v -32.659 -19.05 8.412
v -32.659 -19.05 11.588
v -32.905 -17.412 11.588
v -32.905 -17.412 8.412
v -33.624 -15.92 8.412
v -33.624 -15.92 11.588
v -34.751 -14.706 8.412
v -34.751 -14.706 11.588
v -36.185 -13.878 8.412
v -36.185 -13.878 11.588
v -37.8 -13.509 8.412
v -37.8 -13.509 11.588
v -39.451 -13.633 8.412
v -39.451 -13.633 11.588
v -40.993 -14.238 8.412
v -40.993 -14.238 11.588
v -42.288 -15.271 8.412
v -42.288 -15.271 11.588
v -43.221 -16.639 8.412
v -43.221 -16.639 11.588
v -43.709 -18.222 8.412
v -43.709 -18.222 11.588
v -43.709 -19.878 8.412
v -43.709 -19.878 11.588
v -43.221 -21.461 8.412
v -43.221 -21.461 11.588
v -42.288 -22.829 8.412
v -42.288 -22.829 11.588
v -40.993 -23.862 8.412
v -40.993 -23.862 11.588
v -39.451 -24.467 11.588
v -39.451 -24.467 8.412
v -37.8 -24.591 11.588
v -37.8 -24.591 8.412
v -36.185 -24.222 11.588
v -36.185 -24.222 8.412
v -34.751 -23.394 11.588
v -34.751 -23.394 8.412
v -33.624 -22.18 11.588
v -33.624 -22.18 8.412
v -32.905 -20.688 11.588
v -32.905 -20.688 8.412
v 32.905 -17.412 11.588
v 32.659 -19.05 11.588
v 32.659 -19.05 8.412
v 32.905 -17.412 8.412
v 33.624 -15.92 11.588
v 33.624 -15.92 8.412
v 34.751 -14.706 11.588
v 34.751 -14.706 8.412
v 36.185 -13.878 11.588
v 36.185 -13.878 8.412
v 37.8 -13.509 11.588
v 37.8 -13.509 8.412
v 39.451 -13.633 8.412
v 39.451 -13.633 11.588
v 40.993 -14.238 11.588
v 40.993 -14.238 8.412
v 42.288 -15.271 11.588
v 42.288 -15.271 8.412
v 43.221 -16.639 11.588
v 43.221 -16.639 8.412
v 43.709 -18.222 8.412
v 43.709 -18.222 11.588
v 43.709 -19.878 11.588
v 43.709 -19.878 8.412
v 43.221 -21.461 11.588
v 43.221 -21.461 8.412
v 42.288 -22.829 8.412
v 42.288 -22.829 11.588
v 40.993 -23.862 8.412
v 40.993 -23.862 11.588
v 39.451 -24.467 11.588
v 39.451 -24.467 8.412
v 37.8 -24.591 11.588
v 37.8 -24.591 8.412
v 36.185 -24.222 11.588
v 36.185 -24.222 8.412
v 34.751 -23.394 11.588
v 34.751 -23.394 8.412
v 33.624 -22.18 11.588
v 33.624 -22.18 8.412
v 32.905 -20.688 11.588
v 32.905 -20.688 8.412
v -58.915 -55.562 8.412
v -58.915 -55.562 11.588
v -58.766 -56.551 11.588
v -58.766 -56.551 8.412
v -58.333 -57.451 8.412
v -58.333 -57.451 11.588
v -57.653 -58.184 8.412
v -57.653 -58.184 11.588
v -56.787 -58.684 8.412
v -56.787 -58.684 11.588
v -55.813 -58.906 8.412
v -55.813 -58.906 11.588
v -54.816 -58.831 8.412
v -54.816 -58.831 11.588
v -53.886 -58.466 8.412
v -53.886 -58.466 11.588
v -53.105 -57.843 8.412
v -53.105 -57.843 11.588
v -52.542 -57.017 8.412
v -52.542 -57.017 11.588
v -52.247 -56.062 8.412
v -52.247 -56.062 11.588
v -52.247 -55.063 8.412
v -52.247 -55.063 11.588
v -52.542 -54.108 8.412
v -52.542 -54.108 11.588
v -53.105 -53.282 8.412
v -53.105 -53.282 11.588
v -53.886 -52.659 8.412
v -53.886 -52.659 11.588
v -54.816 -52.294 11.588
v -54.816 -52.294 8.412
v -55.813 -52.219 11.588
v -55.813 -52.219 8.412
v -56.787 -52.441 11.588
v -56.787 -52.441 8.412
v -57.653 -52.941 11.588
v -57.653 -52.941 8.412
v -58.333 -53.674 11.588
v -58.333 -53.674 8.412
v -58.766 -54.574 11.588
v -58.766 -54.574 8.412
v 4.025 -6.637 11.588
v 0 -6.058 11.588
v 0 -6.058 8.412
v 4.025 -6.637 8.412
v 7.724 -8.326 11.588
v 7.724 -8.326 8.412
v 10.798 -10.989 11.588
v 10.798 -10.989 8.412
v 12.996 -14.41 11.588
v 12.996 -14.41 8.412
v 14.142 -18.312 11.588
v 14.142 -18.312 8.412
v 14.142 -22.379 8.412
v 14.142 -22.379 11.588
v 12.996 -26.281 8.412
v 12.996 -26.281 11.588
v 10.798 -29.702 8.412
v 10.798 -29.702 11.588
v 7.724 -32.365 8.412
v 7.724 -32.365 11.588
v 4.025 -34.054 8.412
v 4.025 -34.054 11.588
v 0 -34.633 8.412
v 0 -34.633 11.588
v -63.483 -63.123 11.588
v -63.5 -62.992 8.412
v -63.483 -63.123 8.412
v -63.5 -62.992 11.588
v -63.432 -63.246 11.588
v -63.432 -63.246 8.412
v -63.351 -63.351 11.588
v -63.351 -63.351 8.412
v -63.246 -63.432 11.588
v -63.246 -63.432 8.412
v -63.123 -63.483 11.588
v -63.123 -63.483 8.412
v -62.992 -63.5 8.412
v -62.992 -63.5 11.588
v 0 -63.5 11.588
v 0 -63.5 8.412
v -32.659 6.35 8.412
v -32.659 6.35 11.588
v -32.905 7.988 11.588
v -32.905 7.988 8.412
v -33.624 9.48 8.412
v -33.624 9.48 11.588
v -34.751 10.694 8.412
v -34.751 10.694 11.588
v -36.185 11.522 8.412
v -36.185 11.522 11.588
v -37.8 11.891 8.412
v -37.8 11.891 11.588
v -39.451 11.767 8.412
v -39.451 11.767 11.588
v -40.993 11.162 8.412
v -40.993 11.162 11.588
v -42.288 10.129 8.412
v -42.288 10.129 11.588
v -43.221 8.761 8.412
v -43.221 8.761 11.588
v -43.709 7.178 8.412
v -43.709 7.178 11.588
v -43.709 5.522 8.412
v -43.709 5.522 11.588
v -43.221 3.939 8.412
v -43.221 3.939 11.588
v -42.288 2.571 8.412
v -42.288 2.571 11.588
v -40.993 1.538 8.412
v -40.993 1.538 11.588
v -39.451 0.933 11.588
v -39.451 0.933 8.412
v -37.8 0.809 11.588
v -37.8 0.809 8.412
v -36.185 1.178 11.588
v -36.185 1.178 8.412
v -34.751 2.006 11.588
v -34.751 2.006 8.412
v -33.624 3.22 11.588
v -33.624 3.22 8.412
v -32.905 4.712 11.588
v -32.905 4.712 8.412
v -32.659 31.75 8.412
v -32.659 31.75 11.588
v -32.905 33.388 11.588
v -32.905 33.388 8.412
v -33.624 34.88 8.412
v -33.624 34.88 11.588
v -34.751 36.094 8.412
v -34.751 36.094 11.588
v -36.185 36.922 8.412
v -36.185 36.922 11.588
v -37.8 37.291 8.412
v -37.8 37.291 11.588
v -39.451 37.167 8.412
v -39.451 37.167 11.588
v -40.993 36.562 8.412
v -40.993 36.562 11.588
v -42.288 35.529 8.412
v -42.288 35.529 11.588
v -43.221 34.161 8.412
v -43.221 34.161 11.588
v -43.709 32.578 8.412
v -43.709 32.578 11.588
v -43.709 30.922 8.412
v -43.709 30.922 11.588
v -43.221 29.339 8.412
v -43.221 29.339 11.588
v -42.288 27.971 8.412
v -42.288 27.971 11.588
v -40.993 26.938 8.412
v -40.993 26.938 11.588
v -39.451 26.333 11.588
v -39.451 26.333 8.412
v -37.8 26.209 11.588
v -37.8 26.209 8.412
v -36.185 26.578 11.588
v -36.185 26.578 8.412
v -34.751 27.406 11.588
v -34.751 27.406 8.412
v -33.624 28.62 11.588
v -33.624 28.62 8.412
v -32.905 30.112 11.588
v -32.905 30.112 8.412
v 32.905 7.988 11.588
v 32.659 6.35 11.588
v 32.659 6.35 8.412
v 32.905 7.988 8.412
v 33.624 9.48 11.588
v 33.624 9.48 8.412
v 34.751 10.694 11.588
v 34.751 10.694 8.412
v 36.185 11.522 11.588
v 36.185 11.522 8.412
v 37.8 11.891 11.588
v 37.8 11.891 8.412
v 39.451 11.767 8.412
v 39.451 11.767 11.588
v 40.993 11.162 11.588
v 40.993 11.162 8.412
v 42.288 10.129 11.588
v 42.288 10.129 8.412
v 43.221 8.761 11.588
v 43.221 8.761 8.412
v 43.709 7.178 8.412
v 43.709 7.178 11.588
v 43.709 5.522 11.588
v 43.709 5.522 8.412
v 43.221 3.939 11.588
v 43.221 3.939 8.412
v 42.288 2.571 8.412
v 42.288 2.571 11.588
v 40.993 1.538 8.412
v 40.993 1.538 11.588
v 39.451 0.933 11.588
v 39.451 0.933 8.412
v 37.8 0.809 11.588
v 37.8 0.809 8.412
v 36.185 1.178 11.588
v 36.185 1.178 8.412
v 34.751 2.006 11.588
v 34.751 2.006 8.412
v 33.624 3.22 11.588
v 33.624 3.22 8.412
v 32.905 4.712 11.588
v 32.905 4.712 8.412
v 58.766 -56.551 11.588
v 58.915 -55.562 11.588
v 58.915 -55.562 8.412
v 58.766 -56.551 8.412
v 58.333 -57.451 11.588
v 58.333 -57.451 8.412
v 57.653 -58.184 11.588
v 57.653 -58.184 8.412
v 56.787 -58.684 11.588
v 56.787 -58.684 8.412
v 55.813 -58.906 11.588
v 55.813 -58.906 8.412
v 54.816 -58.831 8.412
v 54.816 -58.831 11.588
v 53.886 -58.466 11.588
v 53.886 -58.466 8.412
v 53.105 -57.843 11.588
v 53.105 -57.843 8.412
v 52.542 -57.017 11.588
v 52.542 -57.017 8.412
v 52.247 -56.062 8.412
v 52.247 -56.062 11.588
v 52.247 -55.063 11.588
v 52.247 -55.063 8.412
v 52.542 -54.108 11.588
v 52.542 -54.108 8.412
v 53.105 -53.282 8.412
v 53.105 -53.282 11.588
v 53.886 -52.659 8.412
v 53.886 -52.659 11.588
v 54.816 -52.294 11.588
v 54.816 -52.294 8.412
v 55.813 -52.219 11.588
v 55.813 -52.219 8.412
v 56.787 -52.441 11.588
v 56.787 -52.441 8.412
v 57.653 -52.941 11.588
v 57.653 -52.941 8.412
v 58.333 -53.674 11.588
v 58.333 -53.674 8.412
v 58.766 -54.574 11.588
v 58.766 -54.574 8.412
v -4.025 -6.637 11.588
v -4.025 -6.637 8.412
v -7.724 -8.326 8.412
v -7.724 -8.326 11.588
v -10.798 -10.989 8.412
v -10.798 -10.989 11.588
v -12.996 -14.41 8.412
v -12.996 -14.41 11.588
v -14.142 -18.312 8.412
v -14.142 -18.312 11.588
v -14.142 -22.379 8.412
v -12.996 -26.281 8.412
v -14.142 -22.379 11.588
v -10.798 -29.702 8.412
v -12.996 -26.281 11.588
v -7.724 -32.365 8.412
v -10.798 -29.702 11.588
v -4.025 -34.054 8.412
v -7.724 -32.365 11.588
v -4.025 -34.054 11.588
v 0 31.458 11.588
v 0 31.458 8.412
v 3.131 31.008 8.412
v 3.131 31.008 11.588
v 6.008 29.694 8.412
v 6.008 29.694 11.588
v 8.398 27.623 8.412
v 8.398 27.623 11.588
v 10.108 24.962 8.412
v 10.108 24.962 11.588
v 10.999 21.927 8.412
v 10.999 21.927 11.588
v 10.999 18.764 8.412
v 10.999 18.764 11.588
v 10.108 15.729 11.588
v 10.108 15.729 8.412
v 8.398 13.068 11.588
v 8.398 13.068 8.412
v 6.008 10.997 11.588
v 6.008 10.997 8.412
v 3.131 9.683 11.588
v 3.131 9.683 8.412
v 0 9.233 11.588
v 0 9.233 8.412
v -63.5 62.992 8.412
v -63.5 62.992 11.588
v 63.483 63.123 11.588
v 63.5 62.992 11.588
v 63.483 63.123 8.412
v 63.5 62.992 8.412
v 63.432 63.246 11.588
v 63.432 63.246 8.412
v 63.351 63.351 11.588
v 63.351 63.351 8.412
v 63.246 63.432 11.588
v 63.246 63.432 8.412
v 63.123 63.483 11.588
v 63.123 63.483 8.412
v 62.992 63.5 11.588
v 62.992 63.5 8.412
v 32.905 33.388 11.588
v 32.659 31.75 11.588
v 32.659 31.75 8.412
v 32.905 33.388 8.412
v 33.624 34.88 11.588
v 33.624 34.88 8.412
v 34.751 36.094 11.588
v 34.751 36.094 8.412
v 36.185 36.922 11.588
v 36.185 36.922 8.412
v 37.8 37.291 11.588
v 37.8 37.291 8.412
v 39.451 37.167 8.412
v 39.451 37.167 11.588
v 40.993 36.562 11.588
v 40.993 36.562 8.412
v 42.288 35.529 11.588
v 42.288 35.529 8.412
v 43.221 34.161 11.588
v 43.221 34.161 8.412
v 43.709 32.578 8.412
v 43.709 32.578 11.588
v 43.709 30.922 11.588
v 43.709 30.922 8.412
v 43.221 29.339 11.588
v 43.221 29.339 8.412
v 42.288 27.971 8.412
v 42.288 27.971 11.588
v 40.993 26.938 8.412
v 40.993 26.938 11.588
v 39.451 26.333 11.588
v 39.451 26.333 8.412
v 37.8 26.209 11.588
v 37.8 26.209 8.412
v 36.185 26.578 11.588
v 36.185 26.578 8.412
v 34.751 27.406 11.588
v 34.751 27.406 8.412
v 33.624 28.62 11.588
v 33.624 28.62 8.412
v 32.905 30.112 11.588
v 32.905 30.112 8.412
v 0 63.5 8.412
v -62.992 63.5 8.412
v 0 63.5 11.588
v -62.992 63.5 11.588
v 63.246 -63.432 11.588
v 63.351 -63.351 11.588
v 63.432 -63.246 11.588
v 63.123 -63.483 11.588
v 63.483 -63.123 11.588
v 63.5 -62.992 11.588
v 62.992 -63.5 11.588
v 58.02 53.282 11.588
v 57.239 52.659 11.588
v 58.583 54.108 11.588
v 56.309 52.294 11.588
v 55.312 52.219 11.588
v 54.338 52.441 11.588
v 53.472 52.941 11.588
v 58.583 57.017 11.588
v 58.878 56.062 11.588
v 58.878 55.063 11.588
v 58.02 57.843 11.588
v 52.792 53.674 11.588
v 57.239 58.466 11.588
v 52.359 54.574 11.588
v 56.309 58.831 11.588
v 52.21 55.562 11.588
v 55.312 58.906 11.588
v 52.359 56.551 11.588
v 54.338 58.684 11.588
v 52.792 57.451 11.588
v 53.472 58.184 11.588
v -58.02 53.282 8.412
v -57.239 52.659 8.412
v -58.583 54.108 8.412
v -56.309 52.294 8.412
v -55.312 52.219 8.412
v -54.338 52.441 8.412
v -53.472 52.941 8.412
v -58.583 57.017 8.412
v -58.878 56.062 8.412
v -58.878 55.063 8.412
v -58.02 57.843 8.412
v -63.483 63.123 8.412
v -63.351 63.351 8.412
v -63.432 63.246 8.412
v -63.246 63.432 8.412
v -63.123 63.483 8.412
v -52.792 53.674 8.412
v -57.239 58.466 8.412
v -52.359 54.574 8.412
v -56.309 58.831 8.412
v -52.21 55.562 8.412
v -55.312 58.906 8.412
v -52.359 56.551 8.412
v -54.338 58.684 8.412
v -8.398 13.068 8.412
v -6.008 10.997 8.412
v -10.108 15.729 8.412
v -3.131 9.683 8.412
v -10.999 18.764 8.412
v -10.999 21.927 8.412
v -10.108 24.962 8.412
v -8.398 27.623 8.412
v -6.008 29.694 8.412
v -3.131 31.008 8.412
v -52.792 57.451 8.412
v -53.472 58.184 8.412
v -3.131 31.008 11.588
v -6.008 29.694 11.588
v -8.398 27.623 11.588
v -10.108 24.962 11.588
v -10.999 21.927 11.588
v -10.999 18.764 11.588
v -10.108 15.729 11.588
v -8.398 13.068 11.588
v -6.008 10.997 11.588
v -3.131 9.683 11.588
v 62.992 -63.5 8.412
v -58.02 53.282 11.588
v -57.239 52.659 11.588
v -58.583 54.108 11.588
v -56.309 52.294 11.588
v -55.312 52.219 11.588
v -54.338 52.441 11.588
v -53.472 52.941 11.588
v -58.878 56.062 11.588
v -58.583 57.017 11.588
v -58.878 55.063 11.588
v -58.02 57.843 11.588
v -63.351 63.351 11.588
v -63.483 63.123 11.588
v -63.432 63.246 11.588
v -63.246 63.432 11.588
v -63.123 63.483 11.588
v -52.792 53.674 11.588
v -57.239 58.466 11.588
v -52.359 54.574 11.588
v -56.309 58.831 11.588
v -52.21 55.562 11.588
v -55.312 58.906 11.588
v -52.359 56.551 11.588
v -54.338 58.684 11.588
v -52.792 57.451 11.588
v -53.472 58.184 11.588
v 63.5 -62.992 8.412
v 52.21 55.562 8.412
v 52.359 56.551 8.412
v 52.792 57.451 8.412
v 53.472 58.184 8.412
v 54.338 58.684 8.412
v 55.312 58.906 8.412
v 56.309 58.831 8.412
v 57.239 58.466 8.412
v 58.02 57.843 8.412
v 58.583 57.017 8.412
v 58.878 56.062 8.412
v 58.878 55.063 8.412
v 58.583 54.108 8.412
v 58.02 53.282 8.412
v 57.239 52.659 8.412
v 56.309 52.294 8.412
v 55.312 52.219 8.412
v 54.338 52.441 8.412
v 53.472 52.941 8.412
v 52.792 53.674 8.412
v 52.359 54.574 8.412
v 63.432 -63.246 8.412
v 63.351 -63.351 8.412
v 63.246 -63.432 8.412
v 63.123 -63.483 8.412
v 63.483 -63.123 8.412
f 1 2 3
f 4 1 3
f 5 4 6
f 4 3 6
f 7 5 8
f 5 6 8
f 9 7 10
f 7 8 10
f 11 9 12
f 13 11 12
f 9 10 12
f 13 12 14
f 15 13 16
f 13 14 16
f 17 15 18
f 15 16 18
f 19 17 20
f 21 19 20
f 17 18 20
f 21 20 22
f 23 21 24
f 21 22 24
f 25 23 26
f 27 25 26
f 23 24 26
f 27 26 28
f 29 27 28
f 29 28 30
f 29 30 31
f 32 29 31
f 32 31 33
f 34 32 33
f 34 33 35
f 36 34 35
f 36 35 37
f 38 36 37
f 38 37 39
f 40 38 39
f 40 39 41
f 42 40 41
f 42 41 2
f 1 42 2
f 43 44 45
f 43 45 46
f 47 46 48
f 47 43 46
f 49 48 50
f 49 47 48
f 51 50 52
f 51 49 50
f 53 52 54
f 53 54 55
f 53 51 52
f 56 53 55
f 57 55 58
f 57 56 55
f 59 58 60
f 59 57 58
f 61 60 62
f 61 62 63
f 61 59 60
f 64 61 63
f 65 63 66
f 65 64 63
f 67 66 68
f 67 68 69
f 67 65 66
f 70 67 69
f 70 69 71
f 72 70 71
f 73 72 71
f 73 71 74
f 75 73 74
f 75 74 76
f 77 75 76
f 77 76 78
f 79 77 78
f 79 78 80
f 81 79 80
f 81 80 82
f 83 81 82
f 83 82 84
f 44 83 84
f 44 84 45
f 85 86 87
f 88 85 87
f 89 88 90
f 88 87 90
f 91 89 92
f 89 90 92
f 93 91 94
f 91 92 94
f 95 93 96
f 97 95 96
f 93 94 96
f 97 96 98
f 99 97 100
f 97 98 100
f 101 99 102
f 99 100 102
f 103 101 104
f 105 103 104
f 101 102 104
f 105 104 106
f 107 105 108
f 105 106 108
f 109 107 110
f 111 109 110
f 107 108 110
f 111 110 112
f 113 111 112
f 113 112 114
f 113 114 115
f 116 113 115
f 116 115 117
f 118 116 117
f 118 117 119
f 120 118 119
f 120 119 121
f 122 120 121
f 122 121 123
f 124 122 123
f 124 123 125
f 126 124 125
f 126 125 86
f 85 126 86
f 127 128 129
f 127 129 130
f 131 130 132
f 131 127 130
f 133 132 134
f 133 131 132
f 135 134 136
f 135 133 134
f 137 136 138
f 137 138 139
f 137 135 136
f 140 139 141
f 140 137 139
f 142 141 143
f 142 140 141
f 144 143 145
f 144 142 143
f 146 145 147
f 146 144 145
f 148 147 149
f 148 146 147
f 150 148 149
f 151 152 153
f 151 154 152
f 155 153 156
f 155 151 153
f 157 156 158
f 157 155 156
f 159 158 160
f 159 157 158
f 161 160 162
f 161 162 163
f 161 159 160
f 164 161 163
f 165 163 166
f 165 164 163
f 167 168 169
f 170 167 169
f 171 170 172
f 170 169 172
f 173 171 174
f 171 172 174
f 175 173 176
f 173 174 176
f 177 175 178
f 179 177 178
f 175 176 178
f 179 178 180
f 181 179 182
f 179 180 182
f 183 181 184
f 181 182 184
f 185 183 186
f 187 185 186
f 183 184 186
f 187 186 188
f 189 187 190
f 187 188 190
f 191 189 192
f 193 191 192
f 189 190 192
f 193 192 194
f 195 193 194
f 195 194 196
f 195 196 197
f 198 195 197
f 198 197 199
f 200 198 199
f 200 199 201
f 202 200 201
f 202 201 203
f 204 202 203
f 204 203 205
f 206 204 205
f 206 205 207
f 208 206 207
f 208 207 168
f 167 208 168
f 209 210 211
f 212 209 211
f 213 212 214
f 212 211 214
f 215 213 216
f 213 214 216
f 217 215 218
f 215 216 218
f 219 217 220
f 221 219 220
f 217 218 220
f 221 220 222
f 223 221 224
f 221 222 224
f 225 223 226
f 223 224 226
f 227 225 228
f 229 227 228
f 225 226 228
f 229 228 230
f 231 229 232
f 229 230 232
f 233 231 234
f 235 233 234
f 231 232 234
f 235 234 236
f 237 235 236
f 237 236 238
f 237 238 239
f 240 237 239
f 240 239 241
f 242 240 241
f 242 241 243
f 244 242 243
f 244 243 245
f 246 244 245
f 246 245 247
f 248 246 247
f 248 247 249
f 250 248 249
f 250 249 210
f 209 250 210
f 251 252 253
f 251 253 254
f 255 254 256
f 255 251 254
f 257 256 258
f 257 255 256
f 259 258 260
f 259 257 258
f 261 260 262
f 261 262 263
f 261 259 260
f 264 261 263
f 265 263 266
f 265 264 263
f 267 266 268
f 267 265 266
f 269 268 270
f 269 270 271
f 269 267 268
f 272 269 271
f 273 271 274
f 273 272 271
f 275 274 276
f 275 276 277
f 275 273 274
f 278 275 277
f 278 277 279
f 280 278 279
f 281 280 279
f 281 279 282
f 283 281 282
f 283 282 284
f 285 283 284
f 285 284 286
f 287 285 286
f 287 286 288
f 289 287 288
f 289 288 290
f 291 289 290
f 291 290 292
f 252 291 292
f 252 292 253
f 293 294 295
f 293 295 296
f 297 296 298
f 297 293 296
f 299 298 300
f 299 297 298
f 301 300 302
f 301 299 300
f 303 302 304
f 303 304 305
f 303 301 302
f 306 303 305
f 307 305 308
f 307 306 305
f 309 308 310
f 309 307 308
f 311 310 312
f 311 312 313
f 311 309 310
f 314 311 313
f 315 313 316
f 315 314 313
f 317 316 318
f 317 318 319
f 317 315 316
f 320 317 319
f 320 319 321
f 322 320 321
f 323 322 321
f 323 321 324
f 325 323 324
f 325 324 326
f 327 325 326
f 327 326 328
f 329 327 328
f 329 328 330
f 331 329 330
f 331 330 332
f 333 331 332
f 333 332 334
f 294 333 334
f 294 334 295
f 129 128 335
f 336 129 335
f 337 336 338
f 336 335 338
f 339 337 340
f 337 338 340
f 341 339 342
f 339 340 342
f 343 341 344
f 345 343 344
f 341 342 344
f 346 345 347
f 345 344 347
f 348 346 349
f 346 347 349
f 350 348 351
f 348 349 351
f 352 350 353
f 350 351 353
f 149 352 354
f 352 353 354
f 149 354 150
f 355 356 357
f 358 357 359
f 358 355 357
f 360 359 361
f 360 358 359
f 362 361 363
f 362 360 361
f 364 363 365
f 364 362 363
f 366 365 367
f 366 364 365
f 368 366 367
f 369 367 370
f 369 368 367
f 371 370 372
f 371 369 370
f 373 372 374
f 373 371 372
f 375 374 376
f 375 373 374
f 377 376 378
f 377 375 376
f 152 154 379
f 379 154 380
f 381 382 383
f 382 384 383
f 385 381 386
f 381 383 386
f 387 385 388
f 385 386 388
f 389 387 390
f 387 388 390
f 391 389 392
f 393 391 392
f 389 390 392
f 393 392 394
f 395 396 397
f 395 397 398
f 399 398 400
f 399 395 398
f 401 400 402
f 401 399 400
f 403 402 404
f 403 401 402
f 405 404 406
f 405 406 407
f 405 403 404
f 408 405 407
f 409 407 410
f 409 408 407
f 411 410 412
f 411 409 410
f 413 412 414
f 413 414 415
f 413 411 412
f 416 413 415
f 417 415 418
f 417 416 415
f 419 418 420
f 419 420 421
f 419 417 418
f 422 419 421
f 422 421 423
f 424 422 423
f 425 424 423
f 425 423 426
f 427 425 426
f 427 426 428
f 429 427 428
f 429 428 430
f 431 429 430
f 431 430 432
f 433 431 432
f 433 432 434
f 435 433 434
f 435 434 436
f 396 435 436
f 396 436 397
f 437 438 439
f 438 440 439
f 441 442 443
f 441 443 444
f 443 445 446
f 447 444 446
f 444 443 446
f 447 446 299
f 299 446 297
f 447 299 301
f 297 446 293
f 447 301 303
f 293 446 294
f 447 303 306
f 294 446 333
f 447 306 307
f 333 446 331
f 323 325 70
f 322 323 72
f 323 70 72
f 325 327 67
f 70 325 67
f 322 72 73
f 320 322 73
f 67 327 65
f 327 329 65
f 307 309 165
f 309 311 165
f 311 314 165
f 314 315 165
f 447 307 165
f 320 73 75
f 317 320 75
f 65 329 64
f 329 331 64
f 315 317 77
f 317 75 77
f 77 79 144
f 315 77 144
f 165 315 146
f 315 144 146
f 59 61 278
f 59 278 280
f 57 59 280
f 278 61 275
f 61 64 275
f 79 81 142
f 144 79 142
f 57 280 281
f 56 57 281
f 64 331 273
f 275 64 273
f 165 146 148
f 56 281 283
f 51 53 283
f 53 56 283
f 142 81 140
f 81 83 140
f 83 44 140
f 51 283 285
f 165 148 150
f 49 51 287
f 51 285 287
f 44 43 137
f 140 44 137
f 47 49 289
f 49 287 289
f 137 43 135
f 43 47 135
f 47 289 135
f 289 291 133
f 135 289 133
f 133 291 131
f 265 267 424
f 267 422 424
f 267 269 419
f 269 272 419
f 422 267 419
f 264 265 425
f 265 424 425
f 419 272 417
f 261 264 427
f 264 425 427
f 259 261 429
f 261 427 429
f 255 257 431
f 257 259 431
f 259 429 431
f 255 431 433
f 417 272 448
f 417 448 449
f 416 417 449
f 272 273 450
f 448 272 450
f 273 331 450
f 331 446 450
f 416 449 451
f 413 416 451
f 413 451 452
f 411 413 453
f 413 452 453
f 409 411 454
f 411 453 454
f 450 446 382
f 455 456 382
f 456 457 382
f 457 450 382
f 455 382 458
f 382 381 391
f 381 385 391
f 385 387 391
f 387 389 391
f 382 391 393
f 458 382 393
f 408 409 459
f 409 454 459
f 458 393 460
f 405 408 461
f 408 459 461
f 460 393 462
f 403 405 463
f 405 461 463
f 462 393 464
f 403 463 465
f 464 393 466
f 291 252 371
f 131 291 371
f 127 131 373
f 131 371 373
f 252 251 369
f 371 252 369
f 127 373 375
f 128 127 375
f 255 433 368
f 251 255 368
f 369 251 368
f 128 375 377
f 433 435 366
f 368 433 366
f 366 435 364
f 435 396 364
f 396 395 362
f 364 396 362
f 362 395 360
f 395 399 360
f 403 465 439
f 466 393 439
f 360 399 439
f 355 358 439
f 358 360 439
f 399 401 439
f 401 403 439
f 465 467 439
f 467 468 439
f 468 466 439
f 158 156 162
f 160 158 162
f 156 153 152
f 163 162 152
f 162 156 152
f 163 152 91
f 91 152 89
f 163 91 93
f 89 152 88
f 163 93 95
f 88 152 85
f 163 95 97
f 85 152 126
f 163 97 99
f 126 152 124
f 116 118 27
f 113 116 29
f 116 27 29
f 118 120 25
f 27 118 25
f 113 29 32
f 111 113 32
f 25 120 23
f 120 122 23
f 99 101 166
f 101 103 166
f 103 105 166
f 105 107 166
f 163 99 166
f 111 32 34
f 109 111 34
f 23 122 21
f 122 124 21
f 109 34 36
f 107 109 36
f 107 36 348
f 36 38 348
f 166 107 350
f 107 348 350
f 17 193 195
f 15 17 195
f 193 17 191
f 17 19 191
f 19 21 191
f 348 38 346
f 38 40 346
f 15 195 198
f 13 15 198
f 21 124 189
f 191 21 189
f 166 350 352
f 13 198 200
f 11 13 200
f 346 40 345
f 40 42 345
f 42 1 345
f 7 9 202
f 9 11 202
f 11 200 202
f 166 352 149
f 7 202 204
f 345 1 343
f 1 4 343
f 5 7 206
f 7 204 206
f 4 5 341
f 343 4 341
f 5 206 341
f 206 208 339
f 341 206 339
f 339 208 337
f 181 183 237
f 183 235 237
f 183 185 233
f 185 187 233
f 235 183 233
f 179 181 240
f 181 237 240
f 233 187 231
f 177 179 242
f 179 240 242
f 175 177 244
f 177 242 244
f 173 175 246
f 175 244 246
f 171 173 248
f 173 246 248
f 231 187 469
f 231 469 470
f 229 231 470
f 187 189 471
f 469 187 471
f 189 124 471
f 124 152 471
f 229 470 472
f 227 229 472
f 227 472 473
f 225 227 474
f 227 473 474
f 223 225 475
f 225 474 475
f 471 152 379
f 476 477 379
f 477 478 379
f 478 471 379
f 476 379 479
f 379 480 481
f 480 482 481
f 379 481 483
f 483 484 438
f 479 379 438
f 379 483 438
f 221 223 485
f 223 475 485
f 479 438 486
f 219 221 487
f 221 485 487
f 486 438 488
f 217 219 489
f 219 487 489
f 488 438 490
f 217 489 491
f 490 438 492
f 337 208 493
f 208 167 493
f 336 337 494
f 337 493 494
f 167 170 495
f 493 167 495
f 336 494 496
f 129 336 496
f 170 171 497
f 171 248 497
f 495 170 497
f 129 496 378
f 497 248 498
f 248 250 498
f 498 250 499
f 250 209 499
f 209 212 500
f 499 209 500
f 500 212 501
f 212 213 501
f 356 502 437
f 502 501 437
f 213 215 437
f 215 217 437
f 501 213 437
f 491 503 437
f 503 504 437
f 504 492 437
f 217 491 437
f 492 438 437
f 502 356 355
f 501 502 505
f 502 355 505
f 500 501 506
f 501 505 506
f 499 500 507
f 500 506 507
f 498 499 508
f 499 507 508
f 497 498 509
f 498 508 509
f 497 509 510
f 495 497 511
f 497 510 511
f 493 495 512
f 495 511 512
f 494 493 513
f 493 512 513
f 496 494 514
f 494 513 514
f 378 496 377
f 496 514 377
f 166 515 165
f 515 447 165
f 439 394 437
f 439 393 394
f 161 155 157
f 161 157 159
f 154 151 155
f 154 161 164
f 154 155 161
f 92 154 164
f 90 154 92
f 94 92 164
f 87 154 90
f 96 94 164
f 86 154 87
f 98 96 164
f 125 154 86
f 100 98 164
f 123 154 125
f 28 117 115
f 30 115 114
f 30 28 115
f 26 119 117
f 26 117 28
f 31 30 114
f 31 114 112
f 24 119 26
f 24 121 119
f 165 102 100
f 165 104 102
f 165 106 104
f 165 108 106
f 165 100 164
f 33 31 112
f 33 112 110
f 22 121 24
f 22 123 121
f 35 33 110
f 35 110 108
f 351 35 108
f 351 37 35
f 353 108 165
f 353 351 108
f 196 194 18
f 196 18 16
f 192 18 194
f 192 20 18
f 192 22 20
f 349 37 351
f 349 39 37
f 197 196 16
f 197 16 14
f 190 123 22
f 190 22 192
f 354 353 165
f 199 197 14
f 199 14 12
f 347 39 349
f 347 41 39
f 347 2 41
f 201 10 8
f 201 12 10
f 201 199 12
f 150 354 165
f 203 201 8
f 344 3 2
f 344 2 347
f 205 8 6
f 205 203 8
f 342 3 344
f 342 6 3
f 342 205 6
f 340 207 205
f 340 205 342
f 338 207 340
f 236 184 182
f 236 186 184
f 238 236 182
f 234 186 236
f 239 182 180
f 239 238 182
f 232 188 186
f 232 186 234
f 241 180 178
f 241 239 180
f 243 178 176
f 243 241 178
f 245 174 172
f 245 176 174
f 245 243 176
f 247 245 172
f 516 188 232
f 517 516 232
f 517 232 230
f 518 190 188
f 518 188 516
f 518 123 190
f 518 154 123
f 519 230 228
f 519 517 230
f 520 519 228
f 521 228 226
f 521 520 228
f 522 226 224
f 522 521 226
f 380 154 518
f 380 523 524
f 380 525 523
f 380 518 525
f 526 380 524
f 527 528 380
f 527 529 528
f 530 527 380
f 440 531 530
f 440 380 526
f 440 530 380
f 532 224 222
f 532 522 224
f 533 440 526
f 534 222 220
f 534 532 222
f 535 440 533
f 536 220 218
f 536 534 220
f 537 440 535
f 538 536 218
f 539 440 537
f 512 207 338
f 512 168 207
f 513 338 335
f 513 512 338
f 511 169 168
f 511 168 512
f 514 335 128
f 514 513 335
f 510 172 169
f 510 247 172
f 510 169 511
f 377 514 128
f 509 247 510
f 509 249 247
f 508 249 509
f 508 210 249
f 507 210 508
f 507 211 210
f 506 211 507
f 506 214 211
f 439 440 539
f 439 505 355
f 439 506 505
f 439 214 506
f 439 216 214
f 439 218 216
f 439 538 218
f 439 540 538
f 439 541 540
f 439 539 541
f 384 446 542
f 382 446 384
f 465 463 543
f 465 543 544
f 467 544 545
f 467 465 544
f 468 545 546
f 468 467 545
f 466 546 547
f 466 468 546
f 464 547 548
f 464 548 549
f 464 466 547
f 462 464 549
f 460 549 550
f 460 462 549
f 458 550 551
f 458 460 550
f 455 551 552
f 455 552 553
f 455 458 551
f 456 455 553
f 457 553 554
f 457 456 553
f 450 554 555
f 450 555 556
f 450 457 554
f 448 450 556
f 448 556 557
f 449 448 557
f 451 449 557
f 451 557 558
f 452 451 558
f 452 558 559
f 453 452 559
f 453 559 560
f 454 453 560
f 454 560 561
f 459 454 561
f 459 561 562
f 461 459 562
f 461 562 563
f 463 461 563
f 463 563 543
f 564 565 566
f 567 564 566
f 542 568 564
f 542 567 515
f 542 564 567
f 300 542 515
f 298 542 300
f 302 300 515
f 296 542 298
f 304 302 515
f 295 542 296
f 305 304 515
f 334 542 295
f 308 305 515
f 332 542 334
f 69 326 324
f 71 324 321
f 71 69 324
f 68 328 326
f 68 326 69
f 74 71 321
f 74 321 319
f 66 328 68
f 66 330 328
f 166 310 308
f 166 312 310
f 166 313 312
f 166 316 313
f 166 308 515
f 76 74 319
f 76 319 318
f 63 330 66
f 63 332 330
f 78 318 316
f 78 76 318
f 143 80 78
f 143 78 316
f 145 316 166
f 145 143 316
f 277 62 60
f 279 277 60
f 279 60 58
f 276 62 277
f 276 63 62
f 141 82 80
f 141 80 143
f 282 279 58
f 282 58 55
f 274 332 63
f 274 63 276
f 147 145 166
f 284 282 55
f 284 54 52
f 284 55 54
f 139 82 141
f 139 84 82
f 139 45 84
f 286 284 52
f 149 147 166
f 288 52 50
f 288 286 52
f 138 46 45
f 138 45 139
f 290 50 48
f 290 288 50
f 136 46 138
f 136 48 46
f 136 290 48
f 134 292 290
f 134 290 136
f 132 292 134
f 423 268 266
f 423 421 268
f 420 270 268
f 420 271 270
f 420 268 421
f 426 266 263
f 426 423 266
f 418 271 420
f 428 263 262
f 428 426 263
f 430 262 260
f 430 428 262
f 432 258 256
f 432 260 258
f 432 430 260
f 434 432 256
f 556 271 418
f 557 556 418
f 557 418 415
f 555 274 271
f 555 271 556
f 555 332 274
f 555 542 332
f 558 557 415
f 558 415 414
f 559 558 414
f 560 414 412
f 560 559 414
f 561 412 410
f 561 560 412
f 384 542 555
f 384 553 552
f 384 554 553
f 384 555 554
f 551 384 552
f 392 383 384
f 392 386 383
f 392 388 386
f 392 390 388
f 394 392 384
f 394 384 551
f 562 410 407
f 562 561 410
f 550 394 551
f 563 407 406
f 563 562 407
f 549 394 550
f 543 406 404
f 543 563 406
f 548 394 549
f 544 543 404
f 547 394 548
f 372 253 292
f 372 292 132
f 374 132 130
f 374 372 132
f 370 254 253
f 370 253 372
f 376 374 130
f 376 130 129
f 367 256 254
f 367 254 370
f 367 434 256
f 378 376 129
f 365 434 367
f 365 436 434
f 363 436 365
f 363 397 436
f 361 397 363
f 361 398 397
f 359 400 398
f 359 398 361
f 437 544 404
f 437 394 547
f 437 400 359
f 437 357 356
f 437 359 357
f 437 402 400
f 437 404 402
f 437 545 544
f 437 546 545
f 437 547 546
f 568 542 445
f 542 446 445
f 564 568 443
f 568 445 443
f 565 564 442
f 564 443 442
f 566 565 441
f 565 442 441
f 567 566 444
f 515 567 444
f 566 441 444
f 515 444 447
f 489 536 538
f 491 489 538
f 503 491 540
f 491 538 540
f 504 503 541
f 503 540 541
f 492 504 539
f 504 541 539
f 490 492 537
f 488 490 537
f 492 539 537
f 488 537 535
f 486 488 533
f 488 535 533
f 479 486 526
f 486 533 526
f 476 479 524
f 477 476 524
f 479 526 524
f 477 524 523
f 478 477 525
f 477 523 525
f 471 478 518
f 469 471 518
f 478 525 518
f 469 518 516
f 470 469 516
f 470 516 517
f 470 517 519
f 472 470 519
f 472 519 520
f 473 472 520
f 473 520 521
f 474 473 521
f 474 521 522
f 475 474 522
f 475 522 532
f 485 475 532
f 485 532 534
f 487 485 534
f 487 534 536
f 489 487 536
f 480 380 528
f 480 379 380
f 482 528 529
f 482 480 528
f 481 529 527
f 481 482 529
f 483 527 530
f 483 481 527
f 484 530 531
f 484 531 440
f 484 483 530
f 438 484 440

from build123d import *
from build123d.topology import SkipClean

# Parameters (mm, degrees)
EXTRUDE1_START = 10
SKETCH1_W      = 63.5
SKETCH1_H      = 127
EXTRUDE1_DEPTH = 1.5875
SKETCH2_R      = 3.3528
SKETCH2_R_2    = 11.1125
SKETCH2_R_3    = 14.2875
SKETCH2_R_4    = 5.55625
EXTRUDE2_DEPTH = 90.858670283
FILLET1_R      = 0.508


with BuildPart() as part:
    # Sketch1 → Extrude1 (new, symmetric)
    with BuildSketch(Plane.XY.offset(EXTRUDE1_START)):
        with Locations((-31.75, 0)):
            Rectangle(SKETCH1_W, SKETCH1_H)
    extrude(amount=EXTRUDE1_DEPTH, both=True)

    # Sketch2 → Extrude2 (cut, through all)
    with BuildSketch(Plane.XY.offset(11.5875)):
        with Locations(Location((-55.5625, -55.5625, 0), (0, 0, 180))):
            Circle(SKETCH2_R)
        with Locations((0, 20.3454)):
            Circle(SKETCH2_R_2)
        with Locations((0, -20.3454)):
            Circle(SKETCH2_R_3)
        with Locations((-38.214808, 6.35)):
            Circle(SKETCH2_R_4)
        with Locations((-38.214808, -19.05)):
            Circle(SKETCH2_R_4)
        with Locations((-38.214808, 31.75)):
            Circle(SKETCH2_R_4)
        with Locations((-55.5625, 55.5625)):
            Circle(SKETCH2_R)
    extrude(amount=-EXTRUDE2_DEPTH, mode=Mode.SUBTRACT)

    # Fillet1
    fillet1_edges = [part.edges().sort_by_distance(p)[0] for p in [
        (-63.5, 63.5, 10),
        (-63.5, -63.5, 10),
    ]]
    fillet(fillet1_edges, radius=FILLET1_R)

    # Mirror1: part across plane


with BuildPart() as part_1:
    with SkipClean():  # the faces are left unmerged after this step: merging them gives an invalid solid
        add(part.part)
        add(part.part.mirror(Plane(origin=(0, 63.5, 11.5875), x_dir=(0, 0, 1), z_dir=(-1, 0, 0))))


solid = part_1.part
